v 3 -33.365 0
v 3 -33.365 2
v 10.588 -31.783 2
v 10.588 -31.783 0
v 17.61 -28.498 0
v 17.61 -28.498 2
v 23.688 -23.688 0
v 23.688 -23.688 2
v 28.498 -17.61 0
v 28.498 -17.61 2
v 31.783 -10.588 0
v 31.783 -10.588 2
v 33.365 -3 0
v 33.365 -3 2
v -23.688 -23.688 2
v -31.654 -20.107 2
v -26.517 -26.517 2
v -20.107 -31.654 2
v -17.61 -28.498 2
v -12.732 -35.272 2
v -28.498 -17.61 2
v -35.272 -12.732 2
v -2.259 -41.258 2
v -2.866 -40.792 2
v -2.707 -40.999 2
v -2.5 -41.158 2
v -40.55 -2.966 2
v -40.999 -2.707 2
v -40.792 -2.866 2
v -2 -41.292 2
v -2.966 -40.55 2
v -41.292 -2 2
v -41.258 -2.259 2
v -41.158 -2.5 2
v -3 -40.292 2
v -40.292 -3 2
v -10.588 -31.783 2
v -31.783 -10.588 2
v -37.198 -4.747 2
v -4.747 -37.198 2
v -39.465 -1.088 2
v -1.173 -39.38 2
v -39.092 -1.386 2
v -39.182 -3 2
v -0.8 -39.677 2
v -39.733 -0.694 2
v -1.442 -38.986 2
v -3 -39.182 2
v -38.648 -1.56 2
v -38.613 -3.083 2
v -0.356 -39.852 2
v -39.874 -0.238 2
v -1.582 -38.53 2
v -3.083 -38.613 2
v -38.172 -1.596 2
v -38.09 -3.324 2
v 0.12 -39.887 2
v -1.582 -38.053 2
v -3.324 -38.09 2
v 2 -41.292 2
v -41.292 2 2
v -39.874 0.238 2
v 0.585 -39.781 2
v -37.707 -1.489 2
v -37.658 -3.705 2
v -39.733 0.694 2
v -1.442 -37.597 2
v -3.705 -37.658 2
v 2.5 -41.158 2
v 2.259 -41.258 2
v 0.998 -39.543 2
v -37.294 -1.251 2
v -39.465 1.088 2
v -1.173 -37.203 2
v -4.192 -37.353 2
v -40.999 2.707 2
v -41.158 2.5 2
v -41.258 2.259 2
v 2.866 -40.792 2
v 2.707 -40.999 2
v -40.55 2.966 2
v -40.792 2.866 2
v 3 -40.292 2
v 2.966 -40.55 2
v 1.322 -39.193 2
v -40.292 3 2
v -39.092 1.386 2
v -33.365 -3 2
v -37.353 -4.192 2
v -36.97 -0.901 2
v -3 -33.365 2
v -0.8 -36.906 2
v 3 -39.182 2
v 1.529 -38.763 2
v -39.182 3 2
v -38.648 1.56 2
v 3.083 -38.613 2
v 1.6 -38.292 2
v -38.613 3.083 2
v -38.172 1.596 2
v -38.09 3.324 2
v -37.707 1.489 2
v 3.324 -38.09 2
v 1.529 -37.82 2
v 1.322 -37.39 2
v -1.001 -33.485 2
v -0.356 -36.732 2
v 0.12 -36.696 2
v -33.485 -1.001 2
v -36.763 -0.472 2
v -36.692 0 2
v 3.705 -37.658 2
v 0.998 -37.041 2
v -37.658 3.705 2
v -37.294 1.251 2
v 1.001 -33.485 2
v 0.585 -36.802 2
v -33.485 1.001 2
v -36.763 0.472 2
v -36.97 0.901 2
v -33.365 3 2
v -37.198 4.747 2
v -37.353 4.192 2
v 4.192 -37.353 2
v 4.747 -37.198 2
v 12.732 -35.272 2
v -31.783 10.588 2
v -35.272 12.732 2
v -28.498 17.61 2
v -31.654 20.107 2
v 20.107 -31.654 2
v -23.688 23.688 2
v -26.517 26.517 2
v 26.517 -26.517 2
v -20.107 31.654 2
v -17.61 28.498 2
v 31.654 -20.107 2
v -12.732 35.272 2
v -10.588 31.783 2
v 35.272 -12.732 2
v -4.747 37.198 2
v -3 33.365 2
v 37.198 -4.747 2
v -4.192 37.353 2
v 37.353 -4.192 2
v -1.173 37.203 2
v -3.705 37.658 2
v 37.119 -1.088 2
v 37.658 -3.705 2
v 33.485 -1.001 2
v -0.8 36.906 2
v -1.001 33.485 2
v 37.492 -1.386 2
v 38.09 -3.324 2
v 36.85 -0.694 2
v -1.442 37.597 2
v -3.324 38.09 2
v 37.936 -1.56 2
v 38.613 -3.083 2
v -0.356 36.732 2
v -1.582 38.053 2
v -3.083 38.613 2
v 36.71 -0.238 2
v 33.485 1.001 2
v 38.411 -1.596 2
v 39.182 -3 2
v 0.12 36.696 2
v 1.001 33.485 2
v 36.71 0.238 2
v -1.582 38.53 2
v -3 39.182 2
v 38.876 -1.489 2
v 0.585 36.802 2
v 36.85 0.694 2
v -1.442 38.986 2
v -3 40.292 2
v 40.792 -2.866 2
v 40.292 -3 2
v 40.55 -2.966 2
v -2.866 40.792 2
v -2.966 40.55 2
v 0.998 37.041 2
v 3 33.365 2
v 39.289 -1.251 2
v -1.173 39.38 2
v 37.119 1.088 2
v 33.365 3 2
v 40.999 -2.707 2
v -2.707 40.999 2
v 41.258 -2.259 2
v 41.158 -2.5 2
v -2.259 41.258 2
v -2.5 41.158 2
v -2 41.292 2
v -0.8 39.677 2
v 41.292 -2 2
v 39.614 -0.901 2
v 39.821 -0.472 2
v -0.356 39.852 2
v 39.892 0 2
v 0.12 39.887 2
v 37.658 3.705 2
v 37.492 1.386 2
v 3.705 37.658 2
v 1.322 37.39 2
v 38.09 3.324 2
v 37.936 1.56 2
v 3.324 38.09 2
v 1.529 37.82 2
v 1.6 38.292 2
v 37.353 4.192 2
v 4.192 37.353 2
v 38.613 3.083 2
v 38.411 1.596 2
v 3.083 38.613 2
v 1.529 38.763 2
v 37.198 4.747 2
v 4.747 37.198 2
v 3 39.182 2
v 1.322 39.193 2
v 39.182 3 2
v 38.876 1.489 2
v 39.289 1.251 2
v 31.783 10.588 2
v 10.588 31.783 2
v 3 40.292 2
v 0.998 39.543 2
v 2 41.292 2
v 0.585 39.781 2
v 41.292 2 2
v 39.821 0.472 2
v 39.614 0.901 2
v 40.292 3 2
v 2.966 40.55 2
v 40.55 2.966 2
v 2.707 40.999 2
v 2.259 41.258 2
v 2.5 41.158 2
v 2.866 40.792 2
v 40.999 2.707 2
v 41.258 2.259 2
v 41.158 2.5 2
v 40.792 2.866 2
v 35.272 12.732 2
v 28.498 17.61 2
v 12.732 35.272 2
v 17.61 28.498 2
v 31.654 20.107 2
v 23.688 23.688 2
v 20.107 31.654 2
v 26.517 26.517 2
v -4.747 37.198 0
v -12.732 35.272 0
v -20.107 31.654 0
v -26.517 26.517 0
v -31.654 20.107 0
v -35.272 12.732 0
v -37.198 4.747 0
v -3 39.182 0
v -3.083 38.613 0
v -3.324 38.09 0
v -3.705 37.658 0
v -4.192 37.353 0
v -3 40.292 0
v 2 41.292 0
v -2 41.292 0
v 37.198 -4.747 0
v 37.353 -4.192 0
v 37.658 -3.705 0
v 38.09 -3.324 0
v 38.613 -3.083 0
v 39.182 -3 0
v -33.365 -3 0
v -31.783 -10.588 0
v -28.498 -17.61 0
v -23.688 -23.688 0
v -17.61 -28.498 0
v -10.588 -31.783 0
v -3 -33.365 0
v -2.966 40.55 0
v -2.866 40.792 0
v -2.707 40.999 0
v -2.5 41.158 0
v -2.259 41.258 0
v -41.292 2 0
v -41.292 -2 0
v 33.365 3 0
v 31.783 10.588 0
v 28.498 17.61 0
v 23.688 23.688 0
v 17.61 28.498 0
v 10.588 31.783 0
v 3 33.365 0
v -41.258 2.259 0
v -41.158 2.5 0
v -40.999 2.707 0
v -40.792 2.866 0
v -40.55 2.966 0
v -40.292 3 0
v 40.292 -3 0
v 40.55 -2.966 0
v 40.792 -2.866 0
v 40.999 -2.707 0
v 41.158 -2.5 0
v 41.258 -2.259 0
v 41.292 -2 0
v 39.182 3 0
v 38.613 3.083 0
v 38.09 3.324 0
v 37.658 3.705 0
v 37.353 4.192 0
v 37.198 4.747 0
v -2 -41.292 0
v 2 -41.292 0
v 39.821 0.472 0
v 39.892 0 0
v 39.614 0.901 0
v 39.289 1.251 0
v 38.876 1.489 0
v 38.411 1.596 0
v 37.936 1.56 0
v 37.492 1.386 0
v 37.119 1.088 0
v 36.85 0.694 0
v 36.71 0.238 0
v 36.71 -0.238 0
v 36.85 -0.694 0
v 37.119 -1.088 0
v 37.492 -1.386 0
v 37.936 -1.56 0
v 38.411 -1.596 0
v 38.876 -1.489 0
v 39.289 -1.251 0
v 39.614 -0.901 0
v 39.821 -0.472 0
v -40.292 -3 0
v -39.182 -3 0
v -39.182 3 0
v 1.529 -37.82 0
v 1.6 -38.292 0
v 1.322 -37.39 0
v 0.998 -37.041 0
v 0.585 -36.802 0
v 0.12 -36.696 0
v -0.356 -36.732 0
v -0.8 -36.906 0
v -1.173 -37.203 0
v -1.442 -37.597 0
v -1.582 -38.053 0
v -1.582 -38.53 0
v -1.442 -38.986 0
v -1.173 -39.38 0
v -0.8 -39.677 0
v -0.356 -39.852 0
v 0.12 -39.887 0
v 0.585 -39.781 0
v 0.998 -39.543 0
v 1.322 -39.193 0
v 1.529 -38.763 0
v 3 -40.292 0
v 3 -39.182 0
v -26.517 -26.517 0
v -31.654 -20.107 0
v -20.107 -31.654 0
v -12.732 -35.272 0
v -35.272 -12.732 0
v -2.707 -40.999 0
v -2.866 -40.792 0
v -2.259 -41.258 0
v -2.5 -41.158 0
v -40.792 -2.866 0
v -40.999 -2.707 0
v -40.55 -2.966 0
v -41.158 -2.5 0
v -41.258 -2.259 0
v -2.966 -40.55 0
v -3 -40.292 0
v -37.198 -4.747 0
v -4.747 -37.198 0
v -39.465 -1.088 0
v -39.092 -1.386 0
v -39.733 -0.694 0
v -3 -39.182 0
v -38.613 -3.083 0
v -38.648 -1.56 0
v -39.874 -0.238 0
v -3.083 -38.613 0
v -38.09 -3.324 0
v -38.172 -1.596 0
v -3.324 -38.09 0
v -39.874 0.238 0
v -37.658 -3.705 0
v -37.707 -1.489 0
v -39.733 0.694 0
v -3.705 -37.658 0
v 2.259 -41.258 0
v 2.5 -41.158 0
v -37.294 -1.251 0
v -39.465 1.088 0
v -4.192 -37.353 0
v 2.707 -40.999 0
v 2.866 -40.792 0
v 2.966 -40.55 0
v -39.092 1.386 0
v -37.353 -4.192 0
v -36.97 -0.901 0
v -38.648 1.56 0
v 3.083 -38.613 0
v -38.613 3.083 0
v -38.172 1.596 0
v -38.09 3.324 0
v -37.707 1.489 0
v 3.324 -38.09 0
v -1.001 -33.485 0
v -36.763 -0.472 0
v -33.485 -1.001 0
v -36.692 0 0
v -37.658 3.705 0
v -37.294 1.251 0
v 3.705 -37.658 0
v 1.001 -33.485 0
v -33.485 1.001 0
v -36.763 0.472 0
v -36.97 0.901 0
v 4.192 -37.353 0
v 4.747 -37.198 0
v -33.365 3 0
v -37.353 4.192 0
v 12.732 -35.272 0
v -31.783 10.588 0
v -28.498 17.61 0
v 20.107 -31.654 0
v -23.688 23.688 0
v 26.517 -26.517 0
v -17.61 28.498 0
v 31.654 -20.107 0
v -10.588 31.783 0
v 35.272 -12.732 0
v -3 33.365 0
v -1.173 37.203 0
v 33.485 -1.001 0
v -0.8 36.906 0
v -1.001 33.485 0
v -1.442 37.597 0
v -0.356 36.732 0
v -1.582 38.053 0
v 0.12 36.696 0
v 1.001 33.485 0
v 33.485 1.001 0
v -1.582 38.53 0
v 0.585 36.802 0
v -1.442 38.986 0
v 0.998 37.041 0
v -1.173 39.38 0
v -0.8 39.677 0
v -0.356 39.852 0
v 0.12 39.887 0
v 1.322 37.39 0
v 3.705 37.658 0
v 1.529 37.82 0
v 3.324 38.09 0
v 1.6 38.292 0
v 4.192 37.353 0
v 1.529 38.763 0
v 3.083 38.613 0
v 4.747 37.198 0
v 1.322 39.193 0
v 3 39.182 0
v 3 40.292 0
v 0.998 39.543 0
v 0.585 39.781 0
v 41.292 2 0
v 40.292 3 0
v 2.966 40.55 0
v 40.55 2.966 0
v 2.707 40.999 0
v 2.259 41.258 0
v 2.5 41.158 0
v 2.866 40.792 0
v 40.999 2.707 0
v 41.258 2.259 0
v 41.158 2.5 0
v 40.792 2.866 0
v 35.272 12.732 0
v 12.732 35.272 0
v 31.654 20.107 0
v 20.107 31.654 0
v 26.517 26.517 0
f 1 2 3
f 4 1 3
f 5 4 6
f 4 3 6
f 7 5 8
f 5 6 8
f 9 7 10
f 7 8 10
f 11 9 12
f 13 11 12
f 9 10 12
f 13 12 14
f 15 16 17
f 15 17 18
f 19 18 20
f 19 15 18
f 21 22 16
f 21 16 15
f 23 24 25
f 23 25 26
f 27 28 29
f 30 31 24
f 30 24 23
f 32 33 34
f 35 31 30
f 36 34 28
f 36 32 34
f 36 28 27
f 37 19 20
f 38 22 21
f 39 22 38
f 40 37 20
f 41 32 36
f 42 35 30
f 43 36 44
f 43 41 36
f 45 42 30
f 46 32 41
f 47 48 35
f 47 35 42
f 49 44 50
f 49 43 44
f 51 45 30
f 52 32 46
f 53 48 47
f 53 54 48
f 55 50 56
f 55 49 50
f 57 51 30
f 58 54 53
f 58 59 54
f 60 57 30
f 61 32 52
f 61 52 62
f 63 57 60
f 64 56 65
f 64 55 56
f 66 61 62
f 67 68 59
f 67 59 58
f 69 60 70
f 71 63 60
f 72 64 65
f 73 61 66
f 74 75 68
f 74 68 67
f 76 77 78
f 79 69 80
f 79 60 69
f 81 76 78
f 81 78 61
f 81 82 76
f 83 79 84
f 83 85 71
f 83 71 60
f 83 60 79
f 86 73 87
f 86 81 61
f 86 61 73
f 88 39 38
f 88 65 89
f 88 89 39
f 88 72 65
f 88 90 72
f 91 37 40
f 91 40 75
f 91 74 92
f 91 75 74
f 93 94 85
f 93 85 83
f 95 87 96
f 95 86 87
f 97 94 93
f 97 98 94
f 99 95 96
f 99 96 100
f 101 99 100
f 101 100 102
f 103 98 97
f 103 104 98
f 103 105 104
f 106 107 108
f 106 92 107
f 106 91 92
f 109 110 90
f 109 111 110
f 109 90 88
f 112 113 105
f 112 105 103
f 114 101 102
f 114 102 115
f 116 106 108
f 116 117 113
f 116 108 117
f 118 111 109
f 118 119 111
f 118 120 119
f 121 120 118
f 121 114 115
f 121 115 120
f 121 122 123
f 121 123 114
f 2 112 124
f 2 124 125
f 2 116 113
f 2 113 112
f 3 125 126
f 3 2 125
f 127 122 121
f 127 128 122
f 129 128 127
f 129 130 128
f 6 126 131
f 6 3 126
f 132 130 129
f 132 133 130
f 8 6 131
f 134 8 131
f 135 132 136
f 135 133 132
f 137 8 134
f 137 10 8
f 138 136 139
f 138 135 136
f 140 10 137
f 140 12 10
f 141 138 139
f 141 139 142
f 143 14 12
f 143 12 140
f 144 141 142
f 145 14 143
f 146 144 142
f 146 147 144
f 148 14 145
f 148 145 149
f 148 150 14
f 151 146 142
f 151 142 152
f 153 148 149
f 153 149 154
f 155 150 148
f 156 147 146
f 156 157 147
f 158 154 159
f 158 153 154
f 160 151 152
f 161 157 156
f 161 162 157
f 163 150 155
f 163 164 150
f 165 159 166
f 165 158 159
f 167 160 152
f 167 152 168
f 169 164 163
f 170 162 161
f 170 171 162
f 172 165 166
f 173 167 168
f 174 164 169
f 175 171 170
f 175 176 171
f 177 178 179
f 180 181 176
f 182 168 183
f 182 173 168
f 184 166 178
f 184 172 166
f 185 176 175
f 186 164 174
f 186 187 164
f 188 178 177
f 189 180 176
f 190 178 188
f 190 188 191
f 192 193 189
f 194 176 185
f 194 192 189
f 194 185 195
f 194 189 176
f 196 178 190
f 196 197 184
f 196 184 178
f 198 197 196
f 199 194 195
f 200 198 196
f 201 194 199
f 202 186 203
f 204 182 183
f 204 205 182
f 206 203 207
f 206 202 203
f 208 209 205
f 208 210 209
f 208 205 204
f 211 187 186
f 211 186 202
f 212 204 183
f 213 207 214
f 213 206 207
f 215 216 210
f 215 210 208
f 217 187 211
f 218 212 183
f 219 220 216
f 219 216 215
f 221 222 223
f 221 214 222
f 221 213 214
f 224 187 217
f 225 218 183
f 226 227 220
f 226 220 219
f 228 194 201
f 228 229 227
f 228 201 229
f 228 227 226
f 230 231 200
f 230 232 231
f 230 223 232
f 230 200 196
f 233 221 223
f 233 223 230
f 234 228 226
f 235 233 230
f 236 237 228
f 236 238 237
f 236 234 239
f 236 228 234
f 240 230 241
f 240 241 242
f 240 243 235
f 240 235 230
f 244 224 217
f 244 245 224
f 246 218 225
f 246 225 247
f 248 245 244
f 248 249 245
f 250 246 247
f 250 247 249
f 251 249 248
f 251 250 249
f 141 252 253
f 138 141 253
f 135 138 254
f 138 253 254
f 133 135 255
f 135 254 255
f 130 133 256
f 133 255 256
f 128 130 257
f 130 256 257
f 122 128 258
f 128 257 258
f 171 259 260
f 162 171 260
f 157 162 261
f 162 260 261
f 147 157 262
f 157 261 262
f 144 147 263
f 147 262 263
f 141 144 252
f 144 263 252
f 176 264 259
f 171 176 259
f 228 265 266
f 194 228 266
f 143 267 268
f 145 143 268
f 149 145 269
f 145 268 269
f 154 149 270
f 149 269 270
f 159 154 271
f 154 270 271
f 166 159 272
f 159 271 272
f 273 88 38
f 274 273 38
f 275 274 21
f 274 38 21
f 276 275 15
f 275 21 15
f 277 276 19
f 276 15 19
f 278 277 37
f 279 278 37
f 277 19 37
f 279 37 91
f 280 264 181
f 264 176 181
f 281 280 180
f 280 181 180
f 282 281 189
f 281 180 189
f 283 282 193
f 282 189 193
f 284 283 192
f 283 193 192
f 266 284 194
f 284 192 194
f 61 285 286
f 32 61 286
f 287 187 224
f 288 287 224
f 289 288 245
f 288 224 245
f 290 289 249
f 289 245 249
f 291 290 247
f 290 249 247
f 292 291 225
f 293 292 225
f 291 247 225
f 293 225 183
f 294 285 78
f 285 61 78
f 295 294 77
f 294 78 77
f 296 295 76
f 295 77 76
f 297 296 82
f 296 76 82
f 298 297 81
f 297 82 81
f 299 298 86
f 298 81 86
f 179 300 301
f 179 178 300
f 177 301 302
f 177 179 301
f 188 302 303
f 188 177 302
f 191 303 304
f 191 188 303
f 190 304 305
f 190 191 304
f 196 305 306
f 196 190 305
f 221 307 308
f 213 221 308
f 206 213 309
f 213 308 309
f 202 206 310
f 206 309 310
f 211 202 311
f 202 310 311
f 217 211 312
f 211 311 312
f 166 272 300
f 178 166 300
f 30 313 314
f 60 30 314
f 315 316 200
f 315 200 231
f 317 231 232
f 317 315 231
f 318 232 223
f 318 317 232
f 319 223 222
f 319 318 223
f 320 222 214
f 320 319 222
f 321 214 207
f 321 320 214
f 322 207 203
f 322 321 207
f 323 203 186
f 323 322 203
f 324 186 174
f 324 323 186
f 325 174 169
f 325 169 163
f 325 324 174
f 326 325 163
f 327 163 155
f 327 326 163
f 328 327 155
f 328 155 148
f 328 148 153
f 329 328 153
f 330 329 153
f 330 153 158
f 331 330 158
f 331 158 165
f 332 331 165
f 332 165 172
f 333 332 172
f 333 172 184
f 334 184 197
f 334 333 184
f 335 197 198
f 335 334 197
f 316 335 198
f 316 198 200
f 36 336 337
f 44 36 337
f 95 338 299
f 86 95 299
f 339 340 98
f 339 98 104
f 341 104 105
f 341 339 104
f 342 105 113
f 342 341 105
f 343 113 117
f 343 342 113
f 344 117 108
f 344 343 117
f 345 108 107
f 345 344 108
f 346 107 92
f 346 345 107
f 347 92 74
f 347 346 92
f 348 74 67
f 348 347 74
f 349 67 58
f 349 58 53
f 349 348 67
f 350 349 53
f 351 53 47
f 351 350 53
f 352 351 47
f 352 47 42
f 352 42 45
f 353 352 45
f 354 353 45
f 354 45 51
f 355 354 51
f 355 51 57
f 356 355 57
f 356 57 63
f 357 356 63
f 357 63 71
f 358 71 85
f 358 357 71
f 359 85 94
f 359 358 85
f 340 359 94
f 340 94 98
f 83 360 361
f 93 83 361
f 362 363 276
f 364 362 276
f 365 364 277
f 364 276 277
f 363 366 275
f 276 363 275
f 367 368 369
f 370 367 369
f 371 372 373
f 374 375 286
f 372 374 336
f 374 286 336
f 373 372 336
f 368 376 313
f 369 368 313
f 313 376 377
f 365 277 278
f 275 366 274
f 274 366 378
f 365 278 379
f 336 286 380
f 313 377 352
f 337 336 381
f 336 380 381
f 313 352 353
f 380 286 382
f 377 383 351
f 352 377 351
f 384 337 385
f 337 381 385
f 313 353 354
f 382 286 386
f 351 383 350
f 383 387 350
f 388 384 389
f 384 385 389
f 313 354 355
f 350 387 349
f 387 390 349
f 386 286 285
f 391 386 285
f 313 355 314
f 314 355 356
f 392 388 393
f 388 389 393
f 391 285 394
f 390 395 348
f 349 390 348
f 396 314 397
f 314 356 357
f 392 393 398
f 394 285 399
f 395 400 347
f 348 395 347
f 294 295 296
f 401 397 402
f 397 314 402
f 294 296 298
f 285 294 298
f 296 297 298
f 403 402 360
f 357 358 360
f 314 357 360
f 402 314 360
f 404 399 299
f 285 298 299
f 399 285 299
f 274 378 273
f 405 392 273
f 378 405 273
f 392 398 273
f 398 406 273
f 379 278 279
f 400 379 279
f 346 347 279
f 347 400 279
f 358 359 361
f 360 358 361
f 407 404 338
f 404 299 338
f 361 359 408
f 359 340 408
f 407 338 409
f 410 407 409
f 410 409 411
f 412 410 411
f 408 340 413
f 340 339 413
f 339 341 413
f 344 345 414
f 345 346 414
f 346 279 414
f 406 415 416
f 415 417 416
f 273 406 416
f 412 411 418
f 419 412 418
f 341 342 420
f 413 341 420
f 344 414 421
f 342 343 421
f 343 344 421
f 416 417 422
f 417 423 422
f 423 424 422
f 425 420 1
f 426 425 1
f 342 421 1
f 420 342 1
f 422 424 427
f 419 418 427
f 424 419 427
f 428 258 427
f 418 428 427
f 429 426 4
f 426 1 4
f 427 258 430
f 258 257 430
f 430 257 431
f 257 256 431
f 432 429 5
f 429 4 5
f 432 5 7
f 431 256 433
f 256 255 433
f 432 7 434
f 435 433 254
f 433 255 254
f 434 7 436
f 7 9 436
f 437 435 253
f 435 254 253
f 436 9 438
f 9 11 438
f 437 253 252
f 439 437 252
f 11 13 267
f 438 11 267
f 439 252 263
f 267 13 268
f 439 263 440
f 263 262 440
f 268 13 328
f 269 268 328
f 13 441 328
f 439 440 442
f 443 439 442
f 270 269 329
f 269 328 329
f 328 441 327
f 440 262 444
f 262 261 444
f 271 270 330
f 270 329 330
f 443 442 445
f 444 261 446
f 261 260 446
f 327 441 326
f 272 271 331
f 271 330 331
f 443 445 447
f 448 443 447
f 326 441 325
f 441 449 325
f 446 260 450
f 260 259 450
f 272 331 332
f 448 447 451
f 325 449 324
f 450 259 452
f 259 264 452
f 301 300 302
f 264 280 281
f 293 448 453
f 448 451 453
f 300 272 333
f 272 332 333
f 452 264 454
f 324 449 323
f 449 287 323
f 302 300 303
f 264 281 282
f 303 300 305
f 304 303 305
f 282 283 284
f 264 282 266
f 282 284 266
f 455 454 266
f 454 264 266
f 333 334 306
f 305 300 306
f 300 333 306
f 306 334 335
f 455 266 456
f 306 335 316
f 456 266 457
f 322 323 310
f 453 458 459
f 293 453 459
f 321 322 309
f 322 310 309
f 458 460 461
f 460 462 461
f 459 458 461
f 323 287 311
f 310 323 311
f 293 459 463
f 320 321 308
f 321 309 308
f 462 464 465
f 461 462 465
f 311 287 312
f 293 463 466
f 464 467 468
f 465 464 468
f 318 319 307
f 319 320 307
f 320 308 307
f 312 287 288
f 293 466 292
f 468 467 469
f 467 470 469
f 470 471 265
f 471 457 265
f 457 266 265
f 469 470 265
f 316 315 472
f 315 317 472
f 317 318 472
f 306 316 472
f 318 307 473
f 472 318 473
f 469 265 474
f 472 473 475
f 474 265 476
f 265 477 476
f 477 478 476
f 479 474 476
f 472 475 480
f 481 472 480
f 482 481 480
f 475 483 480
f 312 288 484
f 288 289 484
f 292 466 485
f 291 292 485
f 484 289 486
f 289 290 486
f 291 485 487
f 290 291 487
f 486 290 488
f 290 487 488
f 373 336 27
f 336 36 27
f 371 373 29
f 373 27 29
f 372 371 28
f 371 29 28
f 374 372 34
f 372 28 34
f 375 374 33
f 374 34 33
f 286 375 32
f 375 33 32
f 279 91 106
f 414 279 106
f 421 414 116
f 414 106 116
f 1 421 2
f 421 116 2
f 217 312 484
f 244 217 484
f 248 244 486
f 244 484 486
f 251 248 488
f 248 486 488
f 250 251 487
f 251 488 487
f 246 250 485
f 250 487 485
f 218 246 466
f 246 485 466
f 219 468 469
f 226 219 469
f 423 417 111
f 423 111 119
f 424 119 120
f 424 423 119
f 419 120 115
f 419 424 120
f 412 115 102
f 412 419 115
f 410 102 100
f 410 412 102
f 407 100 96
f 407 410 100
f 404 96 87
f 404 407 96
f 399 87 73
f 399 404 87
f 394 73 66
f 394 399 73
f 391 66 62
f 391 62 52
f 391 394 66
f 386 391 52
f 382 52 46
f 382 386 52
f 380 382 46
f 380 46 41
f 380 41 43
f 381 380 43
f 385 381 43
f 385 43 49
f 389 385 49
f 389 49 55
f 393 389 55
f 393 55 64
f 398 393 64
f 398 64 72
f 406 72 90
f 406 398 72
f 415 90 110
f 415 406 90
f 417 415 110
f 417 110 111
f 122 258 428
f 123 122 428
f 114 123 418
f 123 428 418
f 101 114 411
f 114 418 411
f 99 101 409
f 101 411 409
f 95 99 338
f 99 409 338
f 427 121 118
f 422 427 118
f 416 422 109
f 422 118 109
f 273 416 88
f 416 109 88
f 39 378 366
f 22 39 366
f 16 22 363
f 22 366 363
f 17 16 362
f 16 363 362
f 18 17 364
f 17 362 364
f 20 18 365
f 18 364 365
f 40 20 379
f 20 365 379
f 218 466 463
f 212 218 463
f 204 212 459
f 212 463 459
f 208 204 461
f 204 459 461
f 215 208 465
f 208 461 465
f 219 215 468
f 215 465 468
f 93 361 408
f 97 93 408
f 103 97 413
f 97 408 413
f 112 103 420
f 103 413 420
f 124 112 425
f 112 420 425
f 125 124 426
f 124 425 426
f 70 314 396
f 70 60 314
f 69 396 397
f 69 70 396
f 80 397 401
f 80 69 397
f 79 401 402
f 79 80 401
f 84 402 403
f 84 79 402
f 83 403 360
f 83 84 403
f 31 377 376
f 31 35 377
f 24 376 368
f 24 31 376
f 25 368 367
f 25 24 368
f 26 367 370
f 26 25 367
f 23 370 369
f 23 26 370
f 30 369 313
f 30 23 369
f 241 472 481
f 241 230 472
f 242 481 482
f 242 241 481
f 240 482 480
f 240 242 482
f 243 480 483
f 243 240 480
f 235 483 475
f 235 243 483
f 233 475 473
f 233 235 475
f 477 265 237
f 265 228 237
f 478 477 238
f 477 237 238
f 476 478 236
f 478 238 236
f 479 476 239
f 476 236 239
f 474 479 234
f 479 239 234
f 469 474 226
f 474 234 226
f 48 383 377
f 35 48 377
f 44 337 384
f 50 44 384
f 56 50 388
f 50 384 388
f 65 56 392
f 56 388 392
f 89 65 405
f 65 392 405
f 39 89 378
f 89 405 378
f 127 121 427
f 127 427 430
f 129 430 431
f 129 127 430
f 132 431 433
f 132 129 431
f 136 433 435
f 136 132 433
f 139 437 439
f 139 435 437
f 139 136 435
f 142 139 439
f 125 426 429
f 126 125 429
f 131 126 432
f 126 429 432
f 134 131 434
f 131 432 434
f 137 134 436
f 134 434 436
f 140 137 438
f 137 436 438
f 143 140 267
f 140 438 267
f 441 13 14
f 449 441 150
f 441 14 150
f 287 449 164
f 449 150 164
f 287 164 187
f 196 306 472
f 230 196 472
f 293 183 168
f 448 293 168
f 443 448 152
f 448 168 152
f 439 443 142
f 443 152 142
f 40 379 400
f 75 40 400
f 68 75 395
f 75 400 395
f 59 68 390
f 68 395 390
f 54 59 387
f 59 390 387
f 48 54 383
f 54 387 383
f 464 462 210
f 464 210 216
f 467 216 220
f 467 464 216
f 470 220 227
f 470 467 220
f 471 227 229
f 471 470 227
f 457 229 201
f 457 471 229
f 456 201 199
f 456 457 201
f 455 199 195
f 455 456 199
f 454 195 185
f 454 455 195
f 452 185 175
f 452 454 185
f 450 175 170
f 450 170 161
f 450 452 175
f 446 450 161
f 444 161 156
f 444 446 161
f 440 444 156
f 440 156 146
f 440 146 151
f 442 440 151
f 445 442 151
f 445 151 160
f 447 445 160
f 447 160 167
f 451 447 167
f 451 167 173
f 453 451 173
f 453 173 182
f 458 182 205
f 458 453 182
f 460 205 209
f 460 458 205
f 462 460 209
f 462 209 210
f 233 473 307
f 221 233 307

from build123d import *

# Parameters (mm, degrees)
SKETCH_1_R          = 1.6
EXTRUDE_1_DEPTH     = 2
SKETCH_3_R          = 4.5
SKETCH_3_R_2        = 1.25
CUT_EXTRUDE_1_DEPTH = 3
CUT_EXTRUDE_2_DEPTH = 3
FILLET_1_R          = 1
SKETCH_5_R          = 33.5
CUT_EXTRUDE_3_DEPTH = 3


with BuildPart() as part:
    # ｽｹｯﾁ1 → ﾎﾞｽ - 押し出し1 (new body)
    with BuildSketch(Plane.XY):
        with BuildLine():
            Line((-3, -39.182266397), (-3, -41.291643997))
            Line((-3, -41.291643997), (3, -41.291643997))
            Line((3, -41.291643997), (3, -39.182266397))
            ThreePointArc((3, -39.182266397), (3.498945518, -37.860587373), (4.746835443, -37.198354174))
            ThreePointArc((4.746835443, -37.198354174), (26.516504294, -26.516504294), (37.198354174, -4.746835443))
            ThreePointArc((37.198354174, -4.746835443), (37.860587373, -3.498945518), (39.182266397, -3))
            Line((39.182266397, -3), (41.291643997, -3))
            Line((41.291643997, -3), (41.291643997, 3))
            Line((41.291643997, 3), (39.182266397, 3))
            ThreePointArc((39.182266397, 3), (37.860587373, 3.498945518), (37.198354174, 4.746835443))
            ThreePointArc((37.198354174, 4.746835443), (26.516504294, 26.516504294), (4.746835443, 37.198354174))
            ThreePointArc((4.746835443, 37.198354174), (3.498945518, 37.860587373), (3, 39.182266397))
            Line((3, 39.182266397), (3, 41.291643997))
            Line((3, 41.291643997), (-3, 41.291643997))
            Line((-3, 41.291643997), (-3, 39.182266397))
            ThreePointArc((-3, 39.182266397), (-3.498945518, 37.860587373), (-4.746835443, 37.198354174))
            ThreePointArc((-4.746835443, 37.198354174), (-26.516504294, 26.516504294), (-37.198354174, 4.746835443))
            ThreePointArc((-37.198354174, 4.746835443), (-37.860587373, 3.498945518), (-39.182266397, 3))
            Line((-39.182266397, 3), (-41.291643997, 3))
            Line((-41.291643997, 3), (-41.291643997, -3))
            Line((-41.291643997, -3), (-39.182266397, -3))
            ThreePointArc((-39.182266397, -3), (-37.860587373, -3.498945518), (-37.198354174, -4.746835443))
            ThreePointArc((-37.198354174, -4.746835443), (-26.516504294, -26.516504294), (-4.746835443, -37.198354174))
            ThreePointArc((-4.746835443, -37.198354174), (-3.498945518, -37.860587373), (-3, -39.182266397))
        make_face()
        with Locations((-38.291643997, 0)):
            Circle(SKETCH_1_R, mode=Mode.SUBTRACT)
        with Locations((0, -38.291643997)):
            Circle(SKETCH_1_R, mode=Mode.SUBTRACT)
        with Locations((0, 38.291643997)):
            Circle(SKETCH_1_R, mode=Mode.SUBTRACT)
        with Locations((38.291643997, 0)):
            Circle(SKETCH_1_R, mode=Mode.SUBTRACT)
    extrude(amount=EXTRUDE_1_DEPTH)

    # ｽｹｯﾁ3 → ｶｯﾄ - 押し出し1 (cut, through all)
    with BuildSketch(Plane.XY.offset(2)):
        Circle(SKETCH_3_R)
        with Locations((0, 8.5)):
            Circle(SKETCH_3_R_2)
        with Locations((8.5, 0)):
            Circle(SKETCH_3_R_2)
        with Locations((0, -8.5)):
            Circle(SKETCH_3_R_2)
        with Locations((-8.5, 0)):
            Circle(SKETCH_3_R_2)
    extrude(amount=-CUT_EXTRUDE_1_DEPTH, mode=Mode.SUBTRACT)

    # ｽｹｯﾁ4 → ｶｯﾄ - 押し出し2 (cut, through all)
    with BuildSketch(Plane.XY.offset(2)):
        with BuildLine():
            Line((-3, 33.365401241), (-3, 12.1346611))
            ThreePointArc((-3, 12.1346611), (-8.838834765, 8.838834765), (-12.1346611, 3))
            Line((-12.1346611, 3), (-33.365401241, 3))
            ThreePointArc((-33.365401241, 3), (-23.68807717, 23.68807717), (-3, 33.365401241))
        make_face()
        with BuildLine():
            Line((3, 33.365401241), (3, 12.1346611))
            ThreePointArc((3, 12.1346611), (8.838834765, 8.838834765), (12.1346611, 3))
            Line((12.1346611, 3), (33.365401241, 3))
            ThreePointArc((33.365401241, 3), (23.68807717, 23.68807717), (3, 33.365401241))
        make_face()
        with BuildLine():
            Line((33.365401241, -3), (12.1346611, -3))
            ThreePointArc((12.1346611, -3), (8.838834765, -8.838834765), (3, -12.1346611))
            Line((3, -12.1346611), (3, -33.365401241))
            ThreePointArc((3, -33.365401241), (23.68807717, -23.68807717), (33.365401241, -3))
        make_face()
        with BuildLine():
            Line((-3, -33.365401241), (-3, -12.1346611))
            ThreePointArc((-3, -12.1346611), (-8.838834765, -8.838834765), (-12.1346611, -3))
            Line((-12.1346611, -3), (-33.365401241, -3))
            ThreePointArc((-33.365401241, -3), (-23.68807717, -23.68807717), (-3, -33.365401241))
        make_face()
    extrude(amount=-CUT_EXTRUDE_2_DEPTH, mode=Mode.SUBTRACT)

    # ﾌｨﾚｯﾄ1
    fillet_1_edges = [part.edges().sort_by_distance(p)[0] for p in [
        (-41.291643997, -3, 1),
        (-41.291643997, 3, 1),
        (-3, 41.291643997, 1),
        (3, 41.291643997, 1),
        (41.291643997, 3, 1),
        (41.291643997, -3, 1),
        (3, -41.291643997, 1),
        (-3, -41.291643997, 1),
    ]]
    fillet(fillet_1_edges, radius=FILLET_1_R)

    # ｽｹｯﾁ5 → ｶｯﾄ - 押し出し3 (cut, through all)
    with BuildSketch(Plane.XY.offset(2)):
        Circle(SKETCH_5_R)
    extrude(amount=-CUT_EXTRUDE_3_DEPTH, mode=Mode.SUBTRACT)


solid = part.part
